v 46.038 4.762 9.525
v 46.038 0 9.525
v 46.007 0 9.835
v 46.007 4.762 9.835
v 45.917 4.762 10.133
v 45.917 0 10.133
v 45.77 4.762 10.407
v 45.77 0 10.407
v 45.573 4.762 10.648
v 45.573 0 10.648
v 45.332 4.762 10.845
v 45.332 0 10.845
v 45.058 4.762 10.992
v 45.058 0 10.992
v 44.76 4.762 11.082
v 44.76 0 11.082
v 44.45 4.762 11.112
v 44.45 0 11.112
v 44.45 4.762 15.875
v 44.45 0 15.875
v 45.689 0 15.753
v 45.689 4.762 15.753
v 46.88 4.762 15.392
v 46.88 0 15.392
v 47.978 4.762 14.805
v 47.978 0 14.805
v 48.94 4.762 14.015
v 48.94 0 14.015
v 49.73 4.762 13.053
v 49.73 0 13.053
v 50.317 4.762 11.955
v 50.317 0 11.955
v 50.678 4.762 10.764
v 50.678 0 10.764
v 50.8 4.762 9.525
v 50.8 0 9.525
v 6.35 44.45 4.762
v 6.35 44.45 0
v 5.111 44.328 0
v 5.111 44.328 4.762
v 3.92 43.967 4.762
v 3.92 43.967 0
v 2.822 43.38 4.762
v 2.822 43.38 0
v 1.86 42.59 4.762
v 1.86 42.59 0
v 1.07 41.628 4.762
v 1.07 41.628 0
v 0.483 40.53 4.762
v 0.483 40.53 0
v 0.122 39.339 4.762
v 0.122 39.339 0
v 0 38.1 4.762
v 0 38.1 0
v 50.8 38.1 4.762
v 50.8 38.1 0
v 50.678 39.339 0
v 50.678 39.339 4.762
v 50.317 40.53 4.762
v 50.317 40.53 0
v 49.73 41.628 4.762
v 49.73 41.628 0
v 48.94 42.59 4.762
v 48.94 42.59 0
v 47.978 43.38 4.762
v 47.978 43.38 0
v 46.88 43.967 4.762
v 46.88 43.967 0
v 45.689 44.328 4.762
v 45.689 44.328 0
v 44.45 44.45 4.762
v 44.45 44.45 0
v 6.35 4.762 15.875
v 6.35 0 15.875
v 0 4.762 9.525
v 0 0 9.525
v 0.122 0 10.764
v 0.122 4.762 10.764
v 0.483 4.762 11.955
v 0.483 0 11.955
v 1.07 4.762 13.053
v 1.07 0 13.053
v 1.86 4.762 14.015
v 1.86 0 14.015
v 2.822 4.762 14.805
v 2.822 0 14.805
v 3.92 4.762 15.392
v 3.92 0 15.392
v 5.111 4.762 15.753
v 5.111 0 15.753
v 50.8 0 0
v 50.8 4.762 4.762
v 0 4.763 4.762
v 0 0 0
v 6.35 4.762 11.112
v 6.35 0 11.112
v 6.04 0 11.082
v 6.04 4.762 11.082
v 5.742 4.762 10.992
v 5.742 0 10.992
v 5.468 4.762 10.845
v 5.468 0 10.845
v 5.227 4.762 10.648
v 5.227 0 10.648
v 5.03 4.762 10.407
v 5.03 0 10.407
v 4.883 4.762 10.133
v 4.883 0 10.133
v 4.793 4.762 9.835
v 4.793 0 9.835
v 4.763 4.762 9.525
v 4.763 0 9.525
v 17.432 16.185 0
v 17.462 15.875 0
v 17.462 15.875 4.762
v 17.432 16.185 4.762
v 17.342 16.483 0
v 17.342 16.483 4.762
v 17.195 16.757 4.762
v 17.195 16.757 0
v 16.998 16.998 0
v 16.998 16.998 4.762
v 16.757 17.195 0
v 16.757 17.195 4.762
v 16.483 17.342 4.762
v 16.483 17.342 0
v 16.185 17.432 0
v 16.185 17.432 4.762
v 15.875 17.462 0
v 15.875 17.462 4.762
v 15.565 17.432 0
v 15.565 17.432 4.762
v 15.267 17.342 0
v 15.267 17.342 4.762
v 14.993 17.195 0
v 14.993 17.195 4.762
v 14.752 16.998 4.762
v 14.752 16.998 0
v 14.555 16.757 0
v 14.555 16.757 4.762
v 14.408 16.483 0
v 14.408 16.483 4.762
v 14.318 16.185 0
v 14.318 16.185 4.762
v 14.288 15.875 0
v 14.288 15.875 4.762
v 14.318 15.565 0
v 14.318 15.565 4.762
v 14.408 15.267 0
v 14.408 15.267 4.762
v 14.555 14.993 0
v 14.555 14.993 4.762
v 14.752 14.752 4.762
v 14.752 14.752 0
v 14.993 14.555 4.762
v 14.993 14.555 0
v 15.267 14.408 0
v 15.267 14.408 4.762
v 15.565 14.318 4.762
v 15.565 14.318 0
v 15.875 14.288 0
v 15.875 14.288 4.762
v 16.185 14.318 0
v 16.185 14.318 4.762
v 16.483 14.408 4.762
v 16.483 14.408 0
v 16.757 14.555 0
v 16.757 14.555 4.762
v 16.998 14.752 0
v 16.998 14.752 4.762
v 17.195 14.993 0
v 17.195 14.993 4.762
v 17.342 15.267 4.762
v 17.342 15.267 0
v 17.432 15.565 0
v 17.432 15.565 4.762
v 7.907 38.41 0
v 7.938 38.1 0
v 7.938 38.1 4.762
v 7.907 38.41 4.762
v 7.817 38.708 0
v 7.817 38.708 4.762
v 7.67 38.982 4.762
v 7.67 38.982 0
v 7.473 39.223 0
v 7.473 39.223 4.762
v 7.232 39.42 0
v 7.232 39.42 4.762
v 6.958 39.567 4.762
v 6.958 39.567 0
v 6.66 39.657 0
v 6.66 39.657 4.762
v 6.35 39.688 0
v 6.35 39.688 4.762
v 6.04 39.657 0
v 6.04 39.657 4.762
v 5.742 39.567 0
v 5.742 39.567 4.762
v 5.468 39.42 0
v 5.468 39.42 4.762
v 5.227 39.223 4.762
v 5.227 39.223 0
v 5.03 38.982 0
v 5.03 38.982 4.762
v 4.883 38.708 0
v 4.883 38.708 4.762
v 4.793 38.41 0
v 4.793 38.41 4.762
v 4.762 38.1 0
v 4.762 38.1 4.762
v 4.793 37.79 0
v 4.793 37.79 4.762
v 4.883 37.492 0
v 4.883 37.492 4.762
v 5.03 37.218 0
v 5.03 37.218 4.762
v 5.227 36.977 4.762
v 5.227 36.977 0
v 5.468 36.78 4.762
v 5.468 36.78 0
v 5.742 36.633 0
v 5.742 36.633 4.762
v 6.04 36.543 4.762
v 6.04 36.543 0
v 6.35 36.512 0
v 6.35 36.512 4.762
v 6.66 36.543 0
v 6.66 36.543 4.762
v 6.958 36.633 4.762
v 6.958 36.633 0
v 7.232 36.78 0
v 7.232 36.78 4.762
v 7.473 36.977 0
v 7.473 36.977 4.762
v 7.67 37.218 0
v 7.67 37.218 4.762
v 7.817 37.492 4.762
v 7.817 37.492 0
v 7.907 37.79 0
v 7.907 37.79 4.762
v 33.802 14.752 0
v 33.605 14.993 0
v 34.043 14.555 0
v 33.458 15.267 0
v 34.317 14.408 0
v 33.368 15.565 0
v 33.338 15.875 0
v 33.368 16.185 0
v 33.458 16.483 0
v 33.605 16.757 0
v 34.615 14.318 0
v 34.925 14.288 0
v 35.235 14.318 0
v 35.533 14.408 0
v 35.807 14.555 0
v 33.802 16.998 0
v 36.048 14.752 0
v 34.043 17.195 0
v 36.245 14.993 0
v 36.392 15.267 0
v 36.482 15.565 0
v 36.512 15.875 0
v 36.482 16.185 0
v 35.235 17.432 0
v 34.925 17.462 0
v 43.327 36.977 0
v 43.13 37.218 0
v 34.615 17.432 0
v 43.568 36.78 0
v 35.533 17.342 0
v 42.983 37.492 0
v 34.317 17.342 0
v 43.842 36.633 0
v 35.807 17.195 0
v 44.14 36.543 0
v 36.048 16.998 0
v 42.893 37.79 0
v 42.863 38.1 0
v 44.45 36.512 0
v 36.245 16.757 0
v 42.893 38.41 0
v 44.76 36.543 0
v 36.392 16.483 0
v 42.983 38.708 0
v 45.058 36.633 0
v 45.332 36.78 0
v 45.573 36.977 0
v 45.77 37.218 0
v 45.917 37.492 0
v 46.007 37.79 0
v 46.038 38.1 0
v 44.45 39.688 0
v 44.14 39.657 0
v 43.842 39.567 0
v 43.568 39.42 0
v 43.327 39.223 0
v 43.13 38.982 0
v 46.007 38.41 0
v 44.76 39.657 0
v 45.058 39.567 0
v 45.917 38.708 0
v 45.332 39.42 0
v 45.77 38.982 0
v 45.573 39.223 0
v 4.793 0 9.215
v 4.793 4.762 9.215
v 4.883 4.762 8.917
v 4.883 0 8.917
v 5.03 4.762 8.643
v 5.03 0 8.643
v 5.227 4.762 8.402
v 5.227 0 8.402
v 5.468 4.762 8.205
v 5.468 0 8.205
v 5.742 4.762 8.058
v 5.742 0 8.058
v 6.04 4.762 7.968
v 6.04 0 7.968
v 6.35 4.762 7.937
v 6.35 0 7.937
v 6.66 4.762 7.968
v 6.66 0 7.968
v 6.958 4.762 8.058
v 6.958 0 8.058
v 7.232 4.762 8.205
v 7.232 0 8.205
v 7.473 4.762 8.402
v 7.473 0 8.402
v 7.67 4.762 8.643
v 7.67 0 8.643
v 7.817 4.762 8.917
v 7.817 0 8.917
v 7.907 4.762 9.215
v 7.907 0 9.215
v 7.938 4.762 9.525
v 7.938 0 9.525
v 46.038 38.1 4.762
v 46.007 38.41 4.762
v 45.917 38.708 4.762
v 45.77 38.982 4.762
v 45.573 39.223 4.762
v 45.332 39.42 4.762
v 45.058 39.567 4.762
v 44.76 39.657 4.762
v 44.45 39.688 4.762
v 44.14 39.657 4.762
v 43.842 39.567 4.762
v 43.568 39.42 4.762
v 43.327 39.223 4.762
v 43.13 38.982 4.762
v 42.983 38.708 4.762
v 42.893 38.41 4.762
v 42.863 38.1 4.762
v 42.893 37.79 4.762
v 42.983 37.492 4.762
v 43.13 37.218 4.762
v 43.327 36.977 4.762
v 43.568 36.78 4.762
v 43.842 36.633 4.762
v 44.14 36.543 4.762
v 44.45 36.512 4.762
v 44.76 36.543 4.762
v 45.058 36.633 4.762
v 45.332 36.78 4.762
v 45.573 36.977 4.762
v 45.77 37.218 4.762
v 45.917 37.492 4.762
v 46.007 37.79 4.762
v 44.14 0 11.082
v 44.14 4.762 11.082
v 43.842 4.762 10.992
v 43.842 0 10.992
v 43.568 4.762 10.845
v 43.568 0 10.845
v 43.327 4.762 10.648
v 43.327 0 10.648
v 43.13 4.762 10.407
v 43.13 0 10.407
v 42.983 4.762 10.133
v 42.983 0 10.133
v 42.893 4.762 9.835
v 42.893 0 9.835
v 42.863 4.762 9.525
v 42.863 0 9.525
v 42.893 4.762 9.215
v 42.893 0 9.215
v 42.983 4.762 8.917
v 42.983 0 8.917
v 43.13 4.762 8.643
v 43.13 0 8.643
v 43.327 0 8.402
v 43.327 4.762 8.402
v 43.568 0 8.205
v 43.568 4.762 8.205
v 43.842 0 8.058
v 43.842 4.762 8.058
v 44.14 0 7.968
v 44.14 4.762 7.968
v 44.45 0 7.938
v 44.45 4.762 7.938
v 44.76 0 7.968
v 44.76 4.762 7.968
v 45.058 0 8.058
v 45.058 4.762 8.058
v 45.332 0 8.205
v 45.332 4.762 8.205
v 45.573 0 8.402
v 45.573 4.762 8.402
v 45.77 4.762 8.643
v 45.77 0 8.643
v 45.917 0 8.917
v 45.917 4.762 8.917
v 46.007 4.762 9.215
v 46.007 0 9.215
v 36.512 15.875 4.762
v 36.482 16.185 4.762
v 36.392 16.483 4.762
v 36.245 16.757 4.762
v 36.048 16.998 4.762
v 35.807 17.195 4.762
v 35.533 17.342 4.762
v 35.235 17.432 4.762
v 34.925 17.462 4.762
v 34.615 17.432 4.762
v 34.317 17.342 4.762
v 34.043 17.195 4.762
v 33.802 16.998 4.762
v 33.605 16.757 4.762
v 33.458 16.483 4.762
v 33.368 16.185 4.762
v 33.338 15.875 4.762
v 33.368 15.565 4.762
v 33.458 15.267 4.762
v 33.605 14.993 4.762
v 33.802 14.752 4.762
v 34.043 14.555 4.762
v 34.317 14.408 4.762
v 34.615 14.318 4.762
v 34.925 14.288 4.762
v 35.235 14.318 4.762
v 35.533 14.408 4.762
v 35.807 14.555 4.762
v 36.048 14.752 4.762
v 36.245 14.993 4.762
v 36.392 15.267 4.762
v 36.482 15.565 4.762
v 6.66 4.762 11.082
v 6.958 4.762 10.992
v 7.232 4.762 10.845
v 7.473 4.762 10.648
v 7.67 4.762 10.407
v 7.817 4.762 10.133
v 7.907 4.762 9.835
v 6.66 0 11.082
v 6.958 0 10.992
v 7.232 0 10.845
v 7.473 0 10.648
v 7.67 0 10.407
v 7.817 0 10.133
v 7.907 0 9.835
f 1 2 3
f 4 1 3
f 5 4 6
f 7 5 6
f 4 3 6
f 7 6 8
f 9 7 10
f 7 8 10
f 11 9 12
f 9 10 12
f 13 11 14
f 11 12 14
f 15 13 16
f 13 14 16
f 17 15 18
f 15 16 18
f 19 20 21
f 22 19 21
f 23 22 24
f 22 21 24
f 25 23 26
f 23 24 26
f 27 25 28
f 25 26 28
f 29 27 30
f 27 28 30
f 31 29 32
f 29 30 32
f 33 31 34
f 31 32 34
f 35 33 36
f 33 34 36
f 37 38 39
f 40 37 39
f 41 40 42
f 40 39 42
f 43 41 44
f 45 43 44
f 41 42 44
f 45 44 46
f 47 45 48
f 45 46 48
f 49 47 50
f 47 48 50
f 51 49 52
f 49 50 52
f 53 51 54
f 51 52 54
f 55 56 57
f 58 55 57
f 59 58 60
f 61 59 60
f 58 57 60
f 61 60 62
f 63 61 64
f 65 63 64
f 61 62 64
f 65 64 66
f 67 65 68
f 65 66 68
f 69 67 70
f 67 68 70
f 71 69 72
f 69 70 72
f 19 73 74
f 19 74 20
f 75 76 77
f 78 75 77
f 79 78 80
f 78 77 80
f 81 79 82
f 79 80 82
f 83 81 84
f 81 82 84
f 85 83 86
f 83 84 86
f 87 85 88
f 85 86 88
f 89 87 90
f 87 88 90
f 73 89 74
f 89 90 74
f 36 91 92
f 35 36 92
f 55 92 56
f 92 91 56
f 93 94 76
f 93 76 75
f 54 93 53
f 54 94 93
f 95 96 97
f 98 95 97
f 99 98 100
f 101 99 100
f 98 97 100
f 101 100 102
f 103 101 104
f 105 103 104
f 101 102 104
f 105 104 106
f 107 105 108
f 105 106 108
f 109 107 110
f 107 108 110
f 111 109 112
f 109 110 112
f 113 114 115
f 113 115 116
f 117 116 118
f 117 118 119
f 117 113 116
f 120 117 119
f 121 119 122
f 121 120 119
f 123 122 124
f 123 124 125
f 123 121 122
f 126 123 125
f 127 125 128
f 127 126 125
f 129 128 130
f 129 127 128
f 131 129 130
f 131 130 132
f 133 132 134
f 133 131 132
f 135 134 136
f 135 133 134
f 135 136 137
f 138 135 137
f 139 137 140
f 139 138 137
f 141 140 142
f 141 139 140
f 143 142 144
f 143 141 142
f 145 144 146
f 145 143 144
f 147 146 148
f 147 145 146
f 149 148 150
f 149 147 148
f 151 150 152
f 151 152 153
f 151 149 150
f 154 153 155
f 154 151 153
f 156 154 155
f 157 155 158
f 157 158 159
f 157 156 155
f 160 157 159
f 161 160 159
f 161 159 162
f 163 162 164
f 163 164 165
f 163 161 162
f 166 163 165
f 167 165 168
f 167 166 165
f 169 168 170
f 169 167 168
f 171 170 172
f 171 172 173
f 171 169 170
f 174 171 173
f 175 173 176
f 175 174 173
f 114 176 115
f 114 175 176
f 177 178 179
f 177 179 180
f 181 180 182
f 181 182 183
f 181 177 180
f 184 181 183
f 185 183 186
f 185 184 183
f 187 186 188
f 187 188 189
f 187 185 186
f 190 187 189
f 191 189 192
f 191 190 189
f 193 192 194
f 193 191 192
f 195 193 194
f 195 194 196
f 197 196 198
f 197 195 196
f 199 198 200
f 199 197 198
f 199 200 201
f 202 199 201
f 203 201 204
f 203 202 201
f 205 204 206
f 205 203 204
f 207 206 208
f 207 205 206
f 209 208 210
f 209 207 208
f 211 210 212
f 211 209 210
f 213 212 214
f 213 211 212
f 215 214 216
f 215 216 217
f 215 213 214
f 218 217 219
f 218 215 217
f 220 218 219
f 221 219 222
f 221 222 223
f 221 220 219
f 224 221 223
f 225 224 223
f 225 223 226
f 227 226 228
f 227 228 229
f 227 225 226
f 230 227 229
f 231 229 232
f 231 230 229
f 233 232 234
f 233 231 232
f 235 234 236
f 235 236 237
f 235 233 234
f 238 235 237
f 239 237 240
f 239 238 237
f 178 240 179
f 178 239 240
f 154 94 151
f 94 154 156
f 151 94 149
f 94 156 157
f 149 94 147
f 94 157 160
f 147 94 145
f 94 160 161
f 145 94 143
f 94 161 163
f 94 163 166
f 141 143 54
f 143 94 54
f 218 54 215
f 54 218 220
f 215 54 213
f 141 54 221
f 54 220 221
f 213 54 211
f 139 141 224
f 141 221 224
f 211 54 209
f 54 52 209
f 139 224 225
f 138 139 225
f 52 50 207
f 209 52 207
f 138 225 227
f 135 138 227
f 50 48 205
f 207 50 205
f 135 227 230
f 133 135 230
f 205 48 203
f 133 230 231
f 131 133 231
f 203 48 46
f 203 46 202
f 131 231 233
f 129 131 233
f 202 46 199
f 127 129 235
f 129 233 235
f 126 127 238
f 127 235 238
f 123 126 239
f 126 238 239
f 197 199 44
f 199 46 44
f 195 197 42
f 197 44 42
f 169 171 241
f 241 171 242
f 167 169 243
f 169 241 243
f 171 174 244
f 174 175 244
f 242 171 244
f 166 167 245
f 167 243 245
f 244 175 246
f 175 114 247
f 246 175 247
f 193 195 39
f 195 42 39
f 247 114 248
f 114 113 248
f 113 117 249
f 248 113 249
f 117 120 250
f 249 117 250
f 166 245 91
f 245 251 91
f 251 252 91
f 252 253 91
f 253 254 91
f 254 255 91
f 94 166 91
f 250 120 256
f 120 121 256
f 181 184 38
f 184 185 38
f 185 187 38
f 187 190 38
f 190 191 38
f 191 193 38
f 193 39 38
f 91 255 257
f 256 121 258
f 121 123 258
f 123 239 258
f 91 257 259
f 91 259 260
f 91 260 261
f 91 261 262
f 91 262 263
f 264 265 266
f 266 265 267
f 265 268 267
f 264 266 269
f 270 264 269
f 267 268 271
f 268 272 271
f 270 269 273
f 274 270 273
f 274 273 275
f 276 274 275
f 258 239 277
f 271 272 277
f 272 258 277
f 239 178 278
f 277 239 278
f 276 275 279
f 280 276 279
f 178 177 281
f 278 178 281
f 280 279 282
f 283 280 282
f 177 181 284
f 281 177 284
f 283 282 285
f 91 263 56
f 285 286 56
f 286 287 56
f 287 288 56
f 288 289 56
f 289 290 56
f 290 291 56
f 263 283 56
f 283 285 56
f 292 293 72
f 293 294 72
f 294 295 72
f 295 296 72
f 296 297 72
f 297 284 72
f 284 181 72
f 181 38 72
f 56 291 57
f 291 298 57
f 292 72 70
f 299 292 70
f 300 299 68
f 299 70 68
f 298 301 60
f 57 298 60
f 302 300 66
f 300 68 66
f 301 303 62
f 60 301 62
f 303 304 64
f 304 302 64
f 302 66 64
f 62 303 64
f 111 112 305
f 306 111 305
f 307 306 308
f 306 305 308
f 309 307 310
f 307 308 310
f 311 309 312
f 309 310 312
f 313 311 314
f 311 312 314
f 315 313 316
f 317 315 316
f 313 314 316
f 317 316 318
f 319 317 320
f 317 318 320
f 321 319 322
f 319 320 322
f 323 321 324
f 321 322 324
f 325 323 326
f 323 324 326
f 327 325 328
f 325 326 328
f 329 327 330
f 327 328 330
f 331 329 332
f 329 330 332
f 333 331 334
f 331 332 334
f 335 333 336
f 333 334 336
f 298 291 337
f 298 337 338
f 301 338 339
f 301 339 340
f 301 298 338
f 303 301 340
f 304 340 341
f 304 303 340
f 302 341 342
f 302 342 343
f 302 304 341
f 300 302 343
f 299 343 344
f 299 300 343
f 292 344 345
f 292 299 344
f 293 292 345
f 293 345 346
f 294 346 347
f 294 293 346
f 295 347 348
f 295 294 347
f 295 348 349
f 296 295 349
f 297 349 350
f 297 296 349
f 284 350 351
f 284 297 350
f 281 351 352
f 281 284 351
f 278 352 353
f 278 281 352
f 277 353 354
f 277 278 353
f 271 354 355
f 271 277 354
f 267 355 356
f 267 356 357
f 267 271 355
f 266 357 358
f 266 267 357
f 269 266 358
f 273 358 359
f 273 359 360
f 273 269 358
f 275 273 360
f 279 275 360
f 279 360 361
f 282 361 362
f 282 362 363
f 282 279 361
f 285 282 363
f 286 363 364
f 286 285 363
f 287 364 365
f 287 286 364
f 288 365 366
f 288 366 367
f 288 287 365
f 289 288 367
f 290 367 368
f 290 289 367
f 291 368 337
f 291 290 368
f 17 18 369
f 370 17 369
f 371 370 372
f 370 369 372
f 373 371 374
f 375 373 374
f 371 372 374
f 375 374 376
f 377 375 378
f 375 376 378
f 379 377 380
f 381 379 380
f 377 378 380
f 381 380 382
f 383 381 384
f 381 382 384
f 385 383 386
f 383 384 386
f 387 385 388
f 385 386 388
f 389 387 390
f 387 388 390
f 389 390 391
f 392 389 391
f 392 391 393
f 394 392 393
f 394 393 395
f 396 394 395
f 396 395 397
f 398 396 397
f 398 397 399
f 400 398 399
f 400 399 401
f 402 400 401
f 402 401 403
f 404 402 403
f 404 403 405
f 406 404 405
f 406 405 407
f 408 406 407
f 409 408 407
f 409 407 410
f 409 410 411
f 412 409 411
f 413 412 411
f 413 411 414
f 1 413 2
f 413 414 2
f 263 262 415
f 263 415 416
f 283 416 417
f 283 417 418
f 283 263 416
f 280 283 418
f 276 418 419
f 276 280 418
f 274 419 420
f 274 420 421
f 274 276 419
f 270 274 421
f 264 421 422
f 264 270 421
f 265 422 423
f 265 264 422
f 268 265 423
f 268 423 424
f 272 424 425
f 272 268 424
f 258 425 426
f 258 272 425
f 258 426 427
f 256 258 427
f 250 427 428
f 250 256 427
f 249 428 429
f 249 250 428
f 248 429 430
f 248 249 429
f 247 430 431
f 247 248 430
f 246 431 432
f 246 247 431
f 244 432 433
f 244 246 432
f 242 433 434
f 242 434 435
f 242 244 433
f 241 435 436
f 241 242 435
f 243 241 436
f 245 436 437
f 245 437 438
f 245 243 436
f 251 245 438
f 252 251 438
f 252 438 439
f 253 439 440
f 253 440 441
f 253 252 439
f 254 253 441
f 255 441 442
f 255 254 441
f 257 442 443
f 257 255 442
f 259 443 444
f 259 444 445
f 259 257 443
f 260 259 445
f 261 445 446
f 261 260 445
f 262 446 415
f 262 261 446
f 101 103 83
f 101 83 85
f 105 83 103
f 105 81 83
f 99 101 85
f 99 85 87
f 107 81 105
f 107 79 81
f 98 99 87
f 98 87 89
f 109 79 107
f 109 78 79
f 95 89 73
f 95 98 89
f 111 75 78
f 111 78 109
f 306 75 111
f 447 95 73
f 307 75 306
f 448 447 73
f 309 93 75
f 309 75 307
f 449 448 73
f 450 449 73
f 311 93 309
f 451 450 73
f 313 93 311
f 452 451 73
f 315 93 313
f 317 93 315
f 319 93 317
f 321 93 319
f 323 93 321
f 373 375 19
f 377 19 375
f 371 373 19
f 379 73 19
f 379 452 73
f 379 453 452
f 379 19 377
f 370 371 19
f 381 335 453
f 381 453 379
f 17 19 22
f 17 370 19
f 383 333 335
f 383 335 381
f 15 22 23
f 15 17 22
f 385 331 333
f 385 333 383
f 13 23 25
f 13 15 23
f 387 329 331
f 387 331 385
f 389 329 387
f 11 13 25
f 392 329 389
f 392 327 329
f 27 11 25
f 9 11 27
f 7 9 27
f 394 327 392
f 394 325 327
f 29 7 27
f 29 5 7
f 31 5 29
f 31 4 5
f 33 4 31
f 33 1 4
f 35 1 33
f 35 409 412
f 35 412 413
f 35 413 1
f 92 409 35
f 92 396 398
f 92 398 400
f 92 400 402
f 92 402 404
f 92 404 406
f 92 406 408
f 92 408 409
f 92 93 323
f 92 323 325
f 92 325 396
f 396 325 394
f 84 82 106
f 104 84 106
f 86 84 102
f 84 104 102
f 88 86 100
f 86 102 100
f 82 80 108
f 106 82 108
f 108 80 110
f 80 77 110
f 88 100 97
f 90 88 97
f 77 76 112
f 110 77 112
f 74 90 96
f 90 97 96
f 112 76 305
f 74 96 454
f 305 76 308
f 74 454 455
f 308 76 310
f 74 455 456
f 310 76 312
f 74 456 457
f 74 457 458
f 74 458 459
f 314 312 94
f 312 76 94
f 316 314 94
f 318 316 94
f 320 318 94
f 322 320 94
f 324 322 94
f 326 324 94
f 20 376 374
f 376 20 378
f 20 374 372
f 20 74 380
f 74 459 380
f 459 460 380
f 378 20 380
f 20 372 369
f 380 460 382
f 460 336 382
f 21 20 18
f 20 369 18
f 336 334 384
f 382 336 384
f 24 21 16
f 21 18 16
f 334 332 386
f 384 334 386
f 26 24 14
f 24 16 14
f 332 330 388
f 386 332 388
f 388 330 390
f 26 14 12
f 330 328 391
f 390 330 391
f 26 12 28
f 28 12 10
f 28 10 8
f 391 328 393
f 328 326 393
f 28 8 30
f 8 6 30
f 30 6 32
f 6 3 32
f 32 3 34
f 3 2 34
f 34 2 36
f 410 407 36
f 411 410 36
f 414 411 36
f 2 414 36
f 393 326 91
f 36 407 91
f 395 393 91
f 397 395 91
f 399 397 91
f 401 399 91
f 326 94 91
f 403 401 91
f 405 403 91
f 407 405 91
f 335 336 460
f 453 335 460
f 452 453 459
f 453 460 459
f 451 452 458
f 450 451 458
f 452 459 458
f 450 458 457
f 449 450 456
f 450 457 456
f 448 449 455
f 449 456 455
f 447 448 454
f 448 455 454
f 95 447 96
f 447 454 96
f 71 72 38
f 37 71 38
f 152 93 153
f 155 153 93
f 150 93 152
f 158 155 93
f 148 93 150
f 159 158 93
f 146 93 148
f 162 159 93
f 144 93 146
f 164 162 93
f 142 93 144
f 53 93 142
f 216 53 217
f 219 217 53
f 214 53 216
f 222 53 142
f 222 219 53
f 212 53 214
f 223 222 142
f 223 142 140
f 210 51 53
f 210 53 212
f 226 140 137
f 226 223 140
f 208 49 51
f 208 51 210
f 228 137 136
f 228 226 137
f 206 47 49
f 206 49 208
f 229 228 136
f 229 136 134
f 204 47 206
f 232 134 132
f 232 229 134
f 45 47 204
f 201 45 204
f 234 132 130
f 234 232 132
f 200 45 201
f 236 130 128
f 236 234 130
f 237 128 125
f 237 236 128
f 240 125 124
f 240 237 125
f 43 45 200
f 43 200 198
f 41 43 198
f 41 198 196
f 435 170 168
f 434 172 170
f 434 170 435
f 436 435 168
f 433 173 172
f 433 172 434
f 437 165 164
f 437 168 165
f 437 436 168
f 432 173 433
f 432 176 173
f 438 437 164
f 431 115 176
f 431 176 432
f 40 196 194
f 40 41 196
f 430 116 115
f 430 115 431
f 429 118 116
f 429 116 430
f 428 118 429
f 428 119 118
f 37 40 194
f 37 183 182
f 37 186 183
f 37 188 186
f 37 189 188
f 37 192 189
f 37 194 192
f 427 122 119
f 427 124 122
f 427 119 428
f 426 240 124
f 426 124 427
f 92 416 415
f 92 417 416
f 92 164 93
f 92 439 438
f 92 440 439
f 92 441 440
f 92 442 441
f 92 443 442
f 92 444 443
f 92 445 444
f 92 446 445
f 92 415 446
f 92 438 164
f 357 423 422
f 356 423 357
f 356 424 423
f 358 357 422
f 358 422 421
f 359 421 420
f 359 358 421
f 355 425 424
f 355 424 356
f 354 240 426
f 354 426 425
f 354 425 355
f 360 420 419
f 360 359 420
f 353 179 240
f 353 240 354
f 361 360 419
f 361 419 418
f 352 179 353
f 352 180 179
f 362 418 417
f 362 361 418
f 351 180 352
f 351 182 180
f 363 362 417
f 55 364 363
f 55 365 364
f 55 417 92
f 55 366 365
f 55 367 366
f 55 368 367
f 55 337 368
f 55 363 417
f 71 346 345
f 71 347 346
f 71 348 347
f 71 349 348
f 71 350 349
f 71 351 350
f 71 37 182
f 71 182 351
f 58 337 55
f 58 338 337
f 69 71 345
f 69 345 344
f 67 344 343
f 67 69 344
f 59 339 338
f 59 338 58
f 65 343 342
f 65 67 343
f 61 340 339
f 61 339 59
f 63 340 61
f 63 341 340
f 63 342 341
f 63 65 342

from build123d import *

# Parameters (mm, degrees)
F0_W     = 50.8
F0_H     = 4.7625
F1_DEPTH = 15.875
F0_R     = 1.5875
F2_DEPTH = 4.7625
F4_DEPTH = 25.4


with BuildPart() as f1:
    # F0 (on Top) → F1 (new body)
    with BuildSketch(Plane.XY):
        with Locations((25.4, 2.38125)):
            Rectangle(F0_W, F0_H)
    extrude(amount=F1_DEPTH)

    # F0 (on Top) → F2 (join)
    with BuildSketch(Plane.XY):
        with Locations((25.4, 2.38125)):
            Rectangle(F0_W, F0_H)
        with BuildLine():
            Line((0, 38.1), (0, 4.7625))
            Line((0, 4.7625), (50.8, 4.7625))
            Line((50.8, 4.7625), (50.8, 38.1))
            ThreePointArc((50.8, 38.1), (48.940128, 42.590128), (44.45, 44.45))
            Line((44.45, 44.45), (6.35, 44.45))
            ThreePointArc((6.35, 44.45), (1.859872, 42.590128), (0, 38.1))
        make_face()
        with Locations((15.875, 15.875)):
            Circle(F0_R, mode=Mode.SUBTRACT)
        with Locations((34.925, 15.875)):
            Circle(F0_R, mode=Mode.SUBTRACT)
        with Locations((6.35, 38.1)):
            Circle(F0_R, mode=Mode.SUBTRACT)
        with Locations((44.45, 38.1)):
            Circle(F0_R, mode=Mode.SUBTRACT)
    extrude(amount=F2_DEPTH)

    # F3 (on face) → F4 (cut)
    with BuildSketch(Plane.XZ):
        with BuildLine():
            ThreePointArc((0, 9.525), (1.859872, 14.015128), (6.35, 15.875))
            Line((6.35, 15.875), (0, 15.875))
            Line((0, 15.875), (0, 9.525))
        make_face()
        with BuildLine():
            ThreePointArc((4.7625, 9.525), (6.35, 7.9375), (7.9375, 9.525))
            ThreePointArc((7.9375, 9.525), (7.472532, 10.647532), (6.35, 11.1125))
            Line((6.35, 11.1125), (6.35, 9.525))
            Line((6.35, 9.525), (4.7625, 9.525))
        make_face()
        with BuildLine():
            Line((6.35, 9.525), (6.35, 11.1125))
            ThreePointArc((6.35, 11.1125), (5.227468, 10.647532), (4.7625, 9.525))
            Line((4.7625, 9.525), (6.35, 9.525))
        make_face()
        with BuildLine():
            Line((50.8, 15.875), (44.45, 15.875))
            ThreePointArc((44.45, 15.875), (48.940128, 14.015128), (50.8, 9.525))
            Line((50.8, 9.525), (50.8, 15.875))
        make_face()
        with BuildLine():
            ThreePointArc((46.0375, 9.525), (45.572532, 10.647532), (44.45, 11.1125))
            Line((44.45, 11.1125), (44.45, 9.525))
            Line((44.45, 9.525), (46.0375, 9.525))
        make_face()
        with BuildLine():
            Line((44.45, 9.525), (44.45, 11.1125))
            ThreePointArc((44.45, 11.1125), (43.327468, 8.402468), (46.0375, 9.525))
            Line((46.0375, 9.525), (44.45, 9.525))
        make_face()
    extrude(amount=-F4_DEPTH, mode=Mode.SUBTRACT)


solid = f1.part
